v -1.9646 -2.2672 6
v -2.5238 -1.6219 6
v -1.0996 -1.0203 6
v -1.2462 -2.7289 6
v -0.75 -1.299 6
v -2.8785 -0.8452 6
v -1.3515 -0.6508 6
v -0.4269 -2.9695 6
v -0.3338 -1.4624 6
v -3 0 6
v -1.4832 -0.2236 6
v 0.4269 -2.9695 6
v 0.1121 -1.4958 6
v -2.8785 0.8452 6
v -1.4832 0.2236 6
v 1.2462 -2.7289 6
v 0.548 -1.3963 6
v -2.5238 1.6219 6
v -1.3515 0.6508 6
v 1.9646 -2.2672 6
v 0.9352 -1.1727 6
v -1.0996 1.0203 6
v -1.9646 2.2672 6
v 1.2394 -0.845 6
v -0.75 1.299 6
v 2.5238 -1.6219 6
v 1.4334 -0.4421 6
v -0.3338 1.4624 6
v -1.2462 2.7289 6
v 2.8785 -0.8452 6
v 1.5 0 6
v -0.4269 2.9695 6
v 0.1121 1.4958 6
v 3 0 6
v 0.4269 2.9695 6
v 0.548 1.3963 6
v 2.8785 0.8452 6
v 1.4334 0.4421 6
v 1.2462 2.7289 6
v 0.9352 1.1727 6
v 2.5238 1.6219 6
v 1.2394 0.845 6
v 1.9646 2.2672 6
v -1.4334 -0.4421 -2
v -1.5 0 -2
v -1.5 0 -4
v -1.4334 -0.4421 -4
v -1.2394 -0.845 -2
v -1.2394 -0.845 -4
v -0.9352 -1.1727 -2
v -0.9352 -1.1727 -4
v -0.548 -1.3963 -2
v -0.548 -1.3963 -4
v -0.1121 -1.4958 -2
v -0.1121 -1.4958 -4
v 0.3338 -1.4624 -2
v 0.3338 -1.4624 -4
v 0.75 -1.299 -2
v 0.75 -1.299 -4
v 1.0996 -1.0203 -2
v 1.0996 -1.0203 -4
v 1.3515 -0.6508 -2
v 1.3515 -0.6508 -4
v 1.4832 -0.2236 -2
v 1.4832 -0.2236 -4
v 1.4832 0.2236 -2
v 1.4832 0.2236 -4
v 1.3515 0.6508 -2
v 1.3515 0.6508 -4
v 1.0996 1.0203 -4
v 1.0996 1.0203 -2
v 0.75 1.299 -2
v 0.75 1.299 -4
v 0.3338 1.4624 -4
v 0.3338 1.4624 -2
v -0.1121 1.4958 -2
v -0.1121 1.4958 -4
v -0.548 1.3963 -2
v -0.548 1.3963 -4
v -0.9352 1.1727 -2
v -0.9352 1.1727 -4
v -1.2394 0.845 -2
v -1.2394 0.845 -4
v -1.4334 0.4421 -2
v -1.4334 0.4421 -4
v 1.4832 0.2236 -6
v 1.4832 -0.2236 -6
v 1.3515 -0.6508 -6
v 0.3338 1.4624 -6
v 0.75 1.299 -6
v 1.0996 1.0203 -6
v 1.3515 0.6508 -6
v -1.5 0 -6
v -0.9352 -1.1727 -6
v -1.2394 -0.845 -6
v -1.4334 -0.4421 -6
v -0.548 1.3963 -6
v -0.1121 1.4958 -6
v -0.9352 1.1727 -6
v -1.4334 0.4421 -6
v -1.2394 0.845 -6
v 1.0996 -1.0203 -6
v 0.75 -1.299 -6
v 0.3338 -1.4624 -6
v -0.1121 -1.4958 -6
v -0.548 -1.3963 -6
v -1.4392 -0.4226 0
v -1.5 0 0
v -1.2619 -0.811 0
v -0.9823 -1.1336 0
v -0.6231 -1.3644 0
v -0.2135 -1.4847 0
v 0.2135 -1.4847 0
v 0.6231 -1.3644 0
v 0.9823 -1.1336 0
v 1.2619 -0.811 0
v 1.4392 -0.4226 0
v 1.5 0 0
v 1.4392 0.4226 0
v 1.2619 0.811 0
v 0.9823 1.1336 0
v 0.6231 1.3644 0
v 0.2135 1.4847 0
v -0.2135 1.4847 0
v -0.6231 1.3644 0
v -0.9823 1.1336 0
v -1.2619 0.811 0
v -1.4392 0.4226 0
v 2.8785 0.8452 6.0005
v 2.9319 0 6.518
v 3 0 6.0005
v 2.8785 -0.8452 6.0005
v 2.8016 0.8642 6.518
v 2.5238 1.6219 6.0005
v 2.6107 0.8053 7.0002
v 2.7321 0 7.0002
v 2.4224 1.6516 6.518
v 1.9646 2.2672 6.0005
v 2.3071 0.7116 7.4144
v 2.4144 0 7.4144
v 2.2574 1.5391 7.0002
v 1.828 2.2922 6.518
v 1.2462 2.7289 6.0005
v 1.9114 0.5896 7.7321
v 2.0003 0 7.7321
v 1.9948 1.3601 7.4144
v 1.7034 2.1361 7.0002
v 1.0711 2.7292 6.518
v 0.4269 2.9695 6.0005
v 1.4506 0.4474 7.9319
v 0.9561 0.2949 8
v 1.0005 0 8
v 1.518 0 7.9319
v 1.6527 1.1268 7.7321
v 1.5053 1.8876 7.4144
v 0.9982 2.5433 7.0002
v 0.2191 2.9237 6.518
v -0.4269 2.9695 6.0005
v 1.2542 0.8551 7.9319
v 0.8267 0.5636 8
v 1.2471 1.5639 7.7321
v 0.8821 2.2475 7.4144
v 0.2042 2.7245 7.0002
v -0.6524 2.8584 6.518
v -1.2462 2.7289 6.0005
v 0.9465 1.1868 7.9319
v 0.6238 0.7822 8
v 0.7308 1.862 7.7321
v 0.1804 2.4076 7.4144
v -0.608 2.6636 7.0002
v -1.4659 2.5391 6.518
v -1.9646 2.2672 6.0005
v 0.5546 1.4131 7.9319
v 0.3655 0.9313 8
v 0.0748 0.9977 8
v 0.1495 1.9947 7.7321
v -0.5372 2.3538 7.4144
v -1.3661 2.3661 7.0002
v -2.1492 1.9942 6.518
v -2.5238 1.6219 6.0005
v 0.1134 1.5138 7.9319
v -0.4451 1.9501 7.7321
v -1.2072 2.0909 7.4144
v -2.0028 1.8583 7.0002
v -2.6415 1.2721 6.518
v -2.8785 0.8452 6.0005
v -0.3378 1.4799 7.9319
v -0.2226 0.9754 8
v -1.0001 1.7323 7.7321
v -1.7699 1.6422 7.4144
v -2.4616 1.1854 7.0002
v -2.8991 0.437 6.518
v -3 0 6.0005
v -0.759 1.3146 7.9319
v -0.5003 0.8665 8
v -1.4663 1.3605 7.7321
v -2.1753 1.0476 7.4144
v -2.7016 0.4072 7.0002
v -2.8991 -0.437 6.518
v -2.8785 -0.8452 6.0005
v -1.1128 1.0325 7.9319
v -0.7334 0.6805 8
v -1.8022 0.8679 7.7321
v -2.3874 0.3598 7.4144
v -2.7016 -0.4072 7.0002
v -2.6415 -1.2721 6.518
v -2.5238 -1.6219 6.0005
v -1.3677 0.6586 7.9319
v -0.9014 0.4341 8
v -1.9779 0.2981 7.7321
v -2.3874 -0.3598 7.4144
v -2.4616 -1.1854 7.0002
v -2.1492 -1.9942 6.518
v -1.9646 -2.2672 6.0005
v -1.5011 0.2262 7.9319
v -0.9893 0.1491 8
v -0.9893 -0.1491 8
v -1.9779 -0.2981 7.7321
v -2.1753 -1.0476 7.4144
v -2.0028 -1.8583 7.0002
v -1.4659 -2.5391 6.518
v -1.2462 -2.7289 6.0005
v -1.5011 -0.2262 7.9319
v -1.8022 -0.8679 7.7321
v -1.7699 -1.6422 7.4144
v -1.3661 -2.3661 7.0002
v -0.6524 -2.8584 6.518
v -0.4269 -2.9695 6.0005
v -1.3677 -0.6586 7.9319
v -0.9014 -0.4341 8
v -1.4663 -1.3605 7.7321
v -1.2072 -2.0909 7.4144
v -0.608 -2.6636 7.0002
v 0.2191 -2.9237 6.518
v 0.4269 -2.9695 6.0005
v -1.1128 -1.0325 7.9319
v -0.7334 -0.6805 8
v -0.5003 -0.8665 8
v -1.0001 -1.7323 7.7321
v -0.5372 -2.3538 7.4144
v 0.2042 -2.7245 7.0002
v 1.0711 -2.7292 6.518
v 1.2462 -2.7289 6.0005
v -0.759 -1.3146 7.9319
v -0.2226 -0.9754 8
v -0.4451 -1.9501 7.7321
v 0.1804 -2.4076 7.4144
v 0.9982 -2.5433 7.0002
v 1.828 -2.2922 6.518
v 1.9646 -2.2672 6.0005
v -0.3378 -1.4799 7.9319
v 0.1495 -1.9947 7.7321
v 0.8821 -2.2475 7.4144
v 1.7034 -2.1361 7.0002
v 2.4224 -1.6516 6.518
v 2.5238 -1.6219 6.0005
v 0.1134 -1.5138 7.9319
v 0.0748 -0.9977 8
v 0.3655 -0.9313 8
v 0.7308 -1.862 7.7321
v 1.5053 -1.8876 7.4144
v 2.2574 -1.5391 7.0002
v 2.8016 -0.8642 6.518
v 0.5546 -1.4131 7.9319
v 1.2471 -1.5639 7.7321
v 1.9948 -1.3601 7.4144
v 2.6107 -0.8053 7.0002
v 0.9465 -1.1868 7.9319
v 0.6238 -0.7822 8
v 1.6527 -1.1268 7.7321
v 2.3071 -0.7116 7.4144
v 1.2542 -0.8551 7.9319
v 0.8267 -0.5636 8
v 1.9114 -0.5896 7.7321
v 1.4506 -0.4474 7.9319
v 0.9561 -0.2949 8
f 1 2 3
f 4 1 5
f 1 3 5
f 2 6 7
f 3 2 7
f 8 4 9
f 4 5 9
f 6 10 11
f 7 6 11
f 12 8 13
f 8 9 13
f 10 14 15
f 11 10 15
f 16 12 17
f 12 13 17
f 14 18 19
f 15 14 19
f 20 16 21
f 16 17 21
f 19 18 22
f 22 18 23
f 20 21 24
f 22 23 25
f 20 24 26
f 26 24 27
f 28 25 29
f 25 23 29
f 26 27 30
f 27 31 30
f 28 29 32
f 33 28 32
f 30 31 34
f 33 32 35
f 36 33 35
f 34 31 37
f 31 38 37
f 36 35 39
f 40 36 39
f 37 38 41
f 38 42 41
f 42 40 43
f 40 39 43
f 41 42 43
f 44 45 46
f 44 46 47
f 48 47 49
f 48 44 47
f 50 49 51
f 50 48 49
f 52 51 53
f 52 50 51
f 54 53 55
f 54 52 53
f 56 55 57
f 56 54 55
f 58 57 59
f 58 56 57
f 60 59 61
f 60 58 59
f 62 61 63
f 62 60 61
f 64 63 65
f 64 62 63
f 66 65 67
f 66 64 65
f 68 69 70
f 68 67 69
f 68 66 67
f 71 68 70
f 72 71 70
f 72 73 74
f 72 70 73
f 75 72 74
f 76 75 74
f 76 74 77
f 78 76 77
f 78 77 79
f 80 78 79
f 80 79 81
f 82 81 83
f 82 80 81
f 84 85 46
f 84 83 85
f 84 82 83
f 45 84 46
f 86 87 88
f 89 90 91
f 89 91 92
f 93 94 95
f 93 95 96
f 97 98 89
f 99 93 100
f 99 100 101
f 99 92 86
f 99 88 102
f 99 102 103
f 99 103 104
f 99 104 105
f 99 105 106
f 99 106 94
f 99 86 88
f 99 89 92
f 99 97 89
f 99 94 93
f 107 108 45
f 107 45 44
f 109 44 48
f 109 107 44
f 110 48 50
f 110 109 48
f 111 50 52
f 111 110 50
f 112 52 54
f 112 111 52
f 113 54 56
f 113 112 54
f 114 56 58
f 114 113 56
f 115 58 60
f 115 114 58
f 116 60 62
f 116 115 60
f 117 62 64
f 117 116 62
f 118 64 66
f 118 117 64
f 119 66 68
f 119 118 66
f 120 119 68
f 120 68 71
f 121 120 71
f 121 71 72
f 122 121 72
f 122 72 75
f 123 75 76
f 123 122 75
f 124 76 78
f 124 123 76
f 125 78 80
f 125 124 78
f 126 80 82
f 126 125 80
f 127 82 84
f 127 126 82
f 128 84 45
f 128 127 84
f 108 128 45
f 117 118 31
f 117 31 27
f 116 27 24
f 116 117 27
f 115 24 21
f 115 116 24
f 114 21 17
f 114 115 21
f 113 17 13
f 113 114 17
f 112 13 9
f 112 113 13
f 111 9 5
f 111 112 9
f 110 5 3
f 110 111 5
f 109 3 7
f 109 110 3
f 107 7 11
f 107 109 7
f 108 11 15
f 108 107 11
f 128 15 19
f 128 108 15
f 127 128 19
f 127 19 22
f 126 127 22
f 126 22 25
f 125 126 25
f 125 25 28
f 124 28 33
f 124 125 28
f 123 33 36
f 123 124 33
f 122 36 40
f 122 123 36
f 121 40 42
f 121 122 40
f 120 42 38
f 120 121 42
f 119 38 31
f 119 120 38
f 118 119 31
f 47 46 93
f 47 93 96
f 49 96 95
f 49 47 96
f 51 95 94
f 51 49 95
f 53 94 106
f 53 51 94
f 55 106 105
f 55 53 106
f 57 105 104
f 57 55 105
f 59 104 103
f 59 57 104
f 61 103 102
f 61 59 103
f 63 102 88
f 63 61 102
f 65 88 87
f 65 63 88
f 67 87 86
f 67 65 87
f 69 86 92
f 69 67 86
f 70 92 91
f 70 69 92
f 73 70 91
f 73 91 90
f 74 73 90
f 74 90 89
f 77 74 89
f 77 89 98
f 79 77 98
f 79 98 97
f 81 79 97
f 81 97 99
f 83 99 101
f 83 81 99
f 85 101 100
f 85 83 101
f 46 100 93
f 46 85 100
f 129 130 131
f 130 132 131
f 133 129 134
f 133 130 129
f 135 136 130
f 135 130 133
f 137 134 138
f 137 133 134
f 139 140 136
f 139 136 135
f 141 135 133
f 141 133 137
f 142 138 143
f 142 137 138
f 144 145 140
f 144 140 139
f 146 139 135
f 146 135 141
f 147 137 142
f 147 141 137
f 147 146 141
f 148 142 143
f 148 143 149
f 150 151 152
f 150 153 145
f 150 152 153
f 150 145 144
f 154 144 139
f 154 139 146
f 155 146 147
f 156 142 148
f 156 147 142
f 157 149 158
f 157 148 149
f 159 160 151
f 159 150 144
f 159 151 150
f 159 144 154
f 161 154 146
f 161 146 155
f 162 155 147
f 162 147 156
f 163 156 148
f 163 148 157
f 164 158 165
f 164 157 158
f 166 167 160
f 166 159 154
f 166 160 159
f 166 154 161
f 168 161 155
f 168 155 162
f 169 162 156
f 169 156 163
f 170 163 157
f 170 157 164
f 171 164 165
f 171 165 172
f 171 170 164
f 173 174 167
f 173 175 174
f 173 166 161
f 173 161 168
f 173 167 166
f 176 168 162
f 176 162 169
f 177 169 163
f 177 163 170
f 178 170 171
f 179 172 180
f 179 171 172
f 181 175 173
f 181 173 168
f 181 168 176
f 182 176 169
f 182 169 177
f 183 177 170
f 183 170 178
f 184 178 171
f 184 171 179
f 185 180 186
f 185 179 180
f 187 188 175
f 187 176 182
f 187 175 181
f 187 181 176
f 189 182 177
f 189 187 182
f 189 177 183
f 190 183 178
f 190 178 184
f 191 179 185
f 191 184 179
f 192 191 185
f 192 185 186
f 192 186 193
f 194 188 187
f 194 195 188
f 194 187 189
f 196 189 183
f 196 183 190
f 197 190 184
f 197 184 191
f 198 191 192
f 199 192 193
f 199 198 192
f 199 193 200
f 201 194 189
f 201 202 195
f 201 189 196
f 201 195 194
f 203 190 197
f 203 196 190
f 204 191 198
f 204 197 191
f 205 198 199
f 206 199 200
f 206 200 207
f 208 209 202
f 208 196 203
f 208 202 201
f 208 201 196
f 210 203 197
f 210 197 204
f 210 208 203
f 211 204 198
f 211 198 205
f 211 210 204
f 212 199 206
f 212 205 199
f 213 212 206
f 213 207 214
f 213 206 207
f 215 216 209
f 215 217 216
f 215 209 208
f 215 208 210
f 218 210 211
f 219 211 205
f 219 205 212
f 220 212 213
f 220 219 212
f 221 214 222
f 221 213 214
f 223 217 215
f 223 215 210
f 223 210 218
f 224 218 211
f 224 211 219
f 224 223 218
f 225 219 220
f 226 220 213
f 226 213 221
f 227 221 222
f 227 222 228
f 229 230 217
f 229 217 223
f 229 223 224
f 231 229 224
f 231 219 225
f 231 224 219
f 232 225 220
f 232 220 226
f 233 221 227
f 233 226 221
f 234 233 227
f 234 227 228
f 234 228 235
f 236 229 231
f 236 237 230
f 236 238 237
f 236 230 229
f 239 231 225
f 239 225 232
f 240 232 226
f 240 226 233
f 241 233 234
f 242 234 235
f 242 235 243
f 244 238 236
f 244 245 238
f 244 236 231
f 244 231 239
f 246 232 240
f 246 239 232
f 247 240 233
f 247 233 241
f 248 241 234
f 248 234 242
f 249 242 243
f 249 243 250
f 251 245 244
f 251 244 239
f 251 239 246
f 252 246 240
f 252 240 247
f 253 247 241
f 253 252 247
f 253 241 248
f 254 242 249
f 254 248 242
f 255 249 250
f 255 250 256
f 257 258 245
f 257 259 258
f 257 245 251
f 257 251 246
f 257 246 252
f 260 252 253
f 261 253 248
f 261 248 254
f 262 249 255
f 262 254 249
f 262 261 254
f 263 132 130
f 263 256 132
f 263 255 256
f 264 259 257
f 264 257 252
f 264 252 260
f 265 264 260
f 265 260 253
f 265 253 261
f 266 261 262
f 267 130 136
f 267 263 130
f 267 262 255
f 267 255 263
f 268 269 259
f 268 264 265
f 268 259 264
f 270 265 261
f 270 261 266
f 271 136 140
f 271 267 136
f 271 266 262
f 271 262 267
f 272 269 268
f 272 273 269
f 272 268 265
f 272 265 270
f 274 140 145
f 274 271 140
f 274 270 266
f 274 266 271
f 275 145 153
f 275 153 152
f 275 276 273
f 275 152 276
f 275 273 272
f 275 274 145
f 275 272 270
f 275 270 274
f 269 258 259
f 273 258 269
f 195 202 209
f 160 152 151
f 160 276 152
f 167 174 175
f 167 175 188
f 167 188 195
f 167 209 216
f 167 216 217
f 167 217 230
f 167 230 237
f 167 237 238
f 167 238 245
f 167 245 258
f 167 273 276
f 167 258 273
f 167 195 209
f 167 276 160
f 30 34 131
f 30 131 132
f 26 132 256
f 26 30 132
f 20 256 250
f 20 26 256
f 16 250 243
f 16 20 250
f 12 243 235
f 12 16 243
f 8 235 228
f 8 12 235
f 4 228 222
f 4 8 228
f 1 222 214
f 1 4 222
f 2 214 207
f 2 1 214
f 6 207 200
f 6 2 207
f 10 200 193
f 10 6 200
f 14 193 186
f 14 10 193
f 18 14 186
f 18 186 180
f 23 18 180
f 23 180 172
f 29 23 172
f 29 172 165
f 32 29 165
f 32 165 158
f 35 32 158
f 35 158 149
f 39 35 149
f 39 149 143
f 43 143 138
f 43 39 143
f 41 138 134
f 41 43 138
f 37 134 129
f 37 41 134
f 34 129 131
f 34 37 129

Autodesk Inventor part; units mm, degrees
ref_plane "YZ Plane" through (0, 0, 0) normal (1, 0, 0) x (0, 1, 0)
ref_plane "XZ Plane" through (0, 0, 0) normal (0, 1, 0) x (-1, 0, 0)
ref_plane "XY Plane" through (0, 0, 0) normal (0, 0, 1) x (1, 0, 0)
sketch "スケッチ1" plane through (0, 0, 0) normal (0, 0, 1) x (1, 0, 0)
  circle A0 centre (0, 0) radius 1.5
  dimension "d0" = 3
extrude "押し出し1" add sketch "スケッチ1" along normal blind 6
sketch "スケッチ2" plane through (0, 0, 6) normal (0, 0, 1) x (1, 0, 0)
  circle A0 centre (0, 0) radius 1.5 projected
  circle A1 centre (0, 0) radius 3
  dimension "d3" = 6
extrude "押し出し2" add sketch "スケッチ2" along normal blind 2 contours A0 | A1
fillet "フィレット1" radius 2 1 edges at (-3, 0, 8)
thread "ねじ1" size "M3x0.5" class "6g" standard "ANSI Metric M Profile" full length
sketch "スケッチ3" plane through (0, 0, 0) normal (0, 0, -1) x (-1, 0, 0)
  circle A0 centre (0, 0) radius 1.5 projected
extrude "押し出し3" add sketch "スケッチ3" along normal blind 2
sketch "スケッチ4" plane through (0, 0, -2) normal (0, 0, -1) x (-1, 0, 0)
  circle A0 centre (0, 0) radius 1.5 projected
extrude "押し出し4" add sketch "スケッチ4" along normal blind 2
sketch "スケッチ5" plane through (0, 0, -4) normal (0, 0, -1) x (-1, 0, 0)
  circle A0 centre (0, 0) radius 1.5 projected
extrude "押し出し5" add sketch "スケッチ5" along normal blind 2
properties part number "SB　12mmなべネジ" material "Steel, Mild"
